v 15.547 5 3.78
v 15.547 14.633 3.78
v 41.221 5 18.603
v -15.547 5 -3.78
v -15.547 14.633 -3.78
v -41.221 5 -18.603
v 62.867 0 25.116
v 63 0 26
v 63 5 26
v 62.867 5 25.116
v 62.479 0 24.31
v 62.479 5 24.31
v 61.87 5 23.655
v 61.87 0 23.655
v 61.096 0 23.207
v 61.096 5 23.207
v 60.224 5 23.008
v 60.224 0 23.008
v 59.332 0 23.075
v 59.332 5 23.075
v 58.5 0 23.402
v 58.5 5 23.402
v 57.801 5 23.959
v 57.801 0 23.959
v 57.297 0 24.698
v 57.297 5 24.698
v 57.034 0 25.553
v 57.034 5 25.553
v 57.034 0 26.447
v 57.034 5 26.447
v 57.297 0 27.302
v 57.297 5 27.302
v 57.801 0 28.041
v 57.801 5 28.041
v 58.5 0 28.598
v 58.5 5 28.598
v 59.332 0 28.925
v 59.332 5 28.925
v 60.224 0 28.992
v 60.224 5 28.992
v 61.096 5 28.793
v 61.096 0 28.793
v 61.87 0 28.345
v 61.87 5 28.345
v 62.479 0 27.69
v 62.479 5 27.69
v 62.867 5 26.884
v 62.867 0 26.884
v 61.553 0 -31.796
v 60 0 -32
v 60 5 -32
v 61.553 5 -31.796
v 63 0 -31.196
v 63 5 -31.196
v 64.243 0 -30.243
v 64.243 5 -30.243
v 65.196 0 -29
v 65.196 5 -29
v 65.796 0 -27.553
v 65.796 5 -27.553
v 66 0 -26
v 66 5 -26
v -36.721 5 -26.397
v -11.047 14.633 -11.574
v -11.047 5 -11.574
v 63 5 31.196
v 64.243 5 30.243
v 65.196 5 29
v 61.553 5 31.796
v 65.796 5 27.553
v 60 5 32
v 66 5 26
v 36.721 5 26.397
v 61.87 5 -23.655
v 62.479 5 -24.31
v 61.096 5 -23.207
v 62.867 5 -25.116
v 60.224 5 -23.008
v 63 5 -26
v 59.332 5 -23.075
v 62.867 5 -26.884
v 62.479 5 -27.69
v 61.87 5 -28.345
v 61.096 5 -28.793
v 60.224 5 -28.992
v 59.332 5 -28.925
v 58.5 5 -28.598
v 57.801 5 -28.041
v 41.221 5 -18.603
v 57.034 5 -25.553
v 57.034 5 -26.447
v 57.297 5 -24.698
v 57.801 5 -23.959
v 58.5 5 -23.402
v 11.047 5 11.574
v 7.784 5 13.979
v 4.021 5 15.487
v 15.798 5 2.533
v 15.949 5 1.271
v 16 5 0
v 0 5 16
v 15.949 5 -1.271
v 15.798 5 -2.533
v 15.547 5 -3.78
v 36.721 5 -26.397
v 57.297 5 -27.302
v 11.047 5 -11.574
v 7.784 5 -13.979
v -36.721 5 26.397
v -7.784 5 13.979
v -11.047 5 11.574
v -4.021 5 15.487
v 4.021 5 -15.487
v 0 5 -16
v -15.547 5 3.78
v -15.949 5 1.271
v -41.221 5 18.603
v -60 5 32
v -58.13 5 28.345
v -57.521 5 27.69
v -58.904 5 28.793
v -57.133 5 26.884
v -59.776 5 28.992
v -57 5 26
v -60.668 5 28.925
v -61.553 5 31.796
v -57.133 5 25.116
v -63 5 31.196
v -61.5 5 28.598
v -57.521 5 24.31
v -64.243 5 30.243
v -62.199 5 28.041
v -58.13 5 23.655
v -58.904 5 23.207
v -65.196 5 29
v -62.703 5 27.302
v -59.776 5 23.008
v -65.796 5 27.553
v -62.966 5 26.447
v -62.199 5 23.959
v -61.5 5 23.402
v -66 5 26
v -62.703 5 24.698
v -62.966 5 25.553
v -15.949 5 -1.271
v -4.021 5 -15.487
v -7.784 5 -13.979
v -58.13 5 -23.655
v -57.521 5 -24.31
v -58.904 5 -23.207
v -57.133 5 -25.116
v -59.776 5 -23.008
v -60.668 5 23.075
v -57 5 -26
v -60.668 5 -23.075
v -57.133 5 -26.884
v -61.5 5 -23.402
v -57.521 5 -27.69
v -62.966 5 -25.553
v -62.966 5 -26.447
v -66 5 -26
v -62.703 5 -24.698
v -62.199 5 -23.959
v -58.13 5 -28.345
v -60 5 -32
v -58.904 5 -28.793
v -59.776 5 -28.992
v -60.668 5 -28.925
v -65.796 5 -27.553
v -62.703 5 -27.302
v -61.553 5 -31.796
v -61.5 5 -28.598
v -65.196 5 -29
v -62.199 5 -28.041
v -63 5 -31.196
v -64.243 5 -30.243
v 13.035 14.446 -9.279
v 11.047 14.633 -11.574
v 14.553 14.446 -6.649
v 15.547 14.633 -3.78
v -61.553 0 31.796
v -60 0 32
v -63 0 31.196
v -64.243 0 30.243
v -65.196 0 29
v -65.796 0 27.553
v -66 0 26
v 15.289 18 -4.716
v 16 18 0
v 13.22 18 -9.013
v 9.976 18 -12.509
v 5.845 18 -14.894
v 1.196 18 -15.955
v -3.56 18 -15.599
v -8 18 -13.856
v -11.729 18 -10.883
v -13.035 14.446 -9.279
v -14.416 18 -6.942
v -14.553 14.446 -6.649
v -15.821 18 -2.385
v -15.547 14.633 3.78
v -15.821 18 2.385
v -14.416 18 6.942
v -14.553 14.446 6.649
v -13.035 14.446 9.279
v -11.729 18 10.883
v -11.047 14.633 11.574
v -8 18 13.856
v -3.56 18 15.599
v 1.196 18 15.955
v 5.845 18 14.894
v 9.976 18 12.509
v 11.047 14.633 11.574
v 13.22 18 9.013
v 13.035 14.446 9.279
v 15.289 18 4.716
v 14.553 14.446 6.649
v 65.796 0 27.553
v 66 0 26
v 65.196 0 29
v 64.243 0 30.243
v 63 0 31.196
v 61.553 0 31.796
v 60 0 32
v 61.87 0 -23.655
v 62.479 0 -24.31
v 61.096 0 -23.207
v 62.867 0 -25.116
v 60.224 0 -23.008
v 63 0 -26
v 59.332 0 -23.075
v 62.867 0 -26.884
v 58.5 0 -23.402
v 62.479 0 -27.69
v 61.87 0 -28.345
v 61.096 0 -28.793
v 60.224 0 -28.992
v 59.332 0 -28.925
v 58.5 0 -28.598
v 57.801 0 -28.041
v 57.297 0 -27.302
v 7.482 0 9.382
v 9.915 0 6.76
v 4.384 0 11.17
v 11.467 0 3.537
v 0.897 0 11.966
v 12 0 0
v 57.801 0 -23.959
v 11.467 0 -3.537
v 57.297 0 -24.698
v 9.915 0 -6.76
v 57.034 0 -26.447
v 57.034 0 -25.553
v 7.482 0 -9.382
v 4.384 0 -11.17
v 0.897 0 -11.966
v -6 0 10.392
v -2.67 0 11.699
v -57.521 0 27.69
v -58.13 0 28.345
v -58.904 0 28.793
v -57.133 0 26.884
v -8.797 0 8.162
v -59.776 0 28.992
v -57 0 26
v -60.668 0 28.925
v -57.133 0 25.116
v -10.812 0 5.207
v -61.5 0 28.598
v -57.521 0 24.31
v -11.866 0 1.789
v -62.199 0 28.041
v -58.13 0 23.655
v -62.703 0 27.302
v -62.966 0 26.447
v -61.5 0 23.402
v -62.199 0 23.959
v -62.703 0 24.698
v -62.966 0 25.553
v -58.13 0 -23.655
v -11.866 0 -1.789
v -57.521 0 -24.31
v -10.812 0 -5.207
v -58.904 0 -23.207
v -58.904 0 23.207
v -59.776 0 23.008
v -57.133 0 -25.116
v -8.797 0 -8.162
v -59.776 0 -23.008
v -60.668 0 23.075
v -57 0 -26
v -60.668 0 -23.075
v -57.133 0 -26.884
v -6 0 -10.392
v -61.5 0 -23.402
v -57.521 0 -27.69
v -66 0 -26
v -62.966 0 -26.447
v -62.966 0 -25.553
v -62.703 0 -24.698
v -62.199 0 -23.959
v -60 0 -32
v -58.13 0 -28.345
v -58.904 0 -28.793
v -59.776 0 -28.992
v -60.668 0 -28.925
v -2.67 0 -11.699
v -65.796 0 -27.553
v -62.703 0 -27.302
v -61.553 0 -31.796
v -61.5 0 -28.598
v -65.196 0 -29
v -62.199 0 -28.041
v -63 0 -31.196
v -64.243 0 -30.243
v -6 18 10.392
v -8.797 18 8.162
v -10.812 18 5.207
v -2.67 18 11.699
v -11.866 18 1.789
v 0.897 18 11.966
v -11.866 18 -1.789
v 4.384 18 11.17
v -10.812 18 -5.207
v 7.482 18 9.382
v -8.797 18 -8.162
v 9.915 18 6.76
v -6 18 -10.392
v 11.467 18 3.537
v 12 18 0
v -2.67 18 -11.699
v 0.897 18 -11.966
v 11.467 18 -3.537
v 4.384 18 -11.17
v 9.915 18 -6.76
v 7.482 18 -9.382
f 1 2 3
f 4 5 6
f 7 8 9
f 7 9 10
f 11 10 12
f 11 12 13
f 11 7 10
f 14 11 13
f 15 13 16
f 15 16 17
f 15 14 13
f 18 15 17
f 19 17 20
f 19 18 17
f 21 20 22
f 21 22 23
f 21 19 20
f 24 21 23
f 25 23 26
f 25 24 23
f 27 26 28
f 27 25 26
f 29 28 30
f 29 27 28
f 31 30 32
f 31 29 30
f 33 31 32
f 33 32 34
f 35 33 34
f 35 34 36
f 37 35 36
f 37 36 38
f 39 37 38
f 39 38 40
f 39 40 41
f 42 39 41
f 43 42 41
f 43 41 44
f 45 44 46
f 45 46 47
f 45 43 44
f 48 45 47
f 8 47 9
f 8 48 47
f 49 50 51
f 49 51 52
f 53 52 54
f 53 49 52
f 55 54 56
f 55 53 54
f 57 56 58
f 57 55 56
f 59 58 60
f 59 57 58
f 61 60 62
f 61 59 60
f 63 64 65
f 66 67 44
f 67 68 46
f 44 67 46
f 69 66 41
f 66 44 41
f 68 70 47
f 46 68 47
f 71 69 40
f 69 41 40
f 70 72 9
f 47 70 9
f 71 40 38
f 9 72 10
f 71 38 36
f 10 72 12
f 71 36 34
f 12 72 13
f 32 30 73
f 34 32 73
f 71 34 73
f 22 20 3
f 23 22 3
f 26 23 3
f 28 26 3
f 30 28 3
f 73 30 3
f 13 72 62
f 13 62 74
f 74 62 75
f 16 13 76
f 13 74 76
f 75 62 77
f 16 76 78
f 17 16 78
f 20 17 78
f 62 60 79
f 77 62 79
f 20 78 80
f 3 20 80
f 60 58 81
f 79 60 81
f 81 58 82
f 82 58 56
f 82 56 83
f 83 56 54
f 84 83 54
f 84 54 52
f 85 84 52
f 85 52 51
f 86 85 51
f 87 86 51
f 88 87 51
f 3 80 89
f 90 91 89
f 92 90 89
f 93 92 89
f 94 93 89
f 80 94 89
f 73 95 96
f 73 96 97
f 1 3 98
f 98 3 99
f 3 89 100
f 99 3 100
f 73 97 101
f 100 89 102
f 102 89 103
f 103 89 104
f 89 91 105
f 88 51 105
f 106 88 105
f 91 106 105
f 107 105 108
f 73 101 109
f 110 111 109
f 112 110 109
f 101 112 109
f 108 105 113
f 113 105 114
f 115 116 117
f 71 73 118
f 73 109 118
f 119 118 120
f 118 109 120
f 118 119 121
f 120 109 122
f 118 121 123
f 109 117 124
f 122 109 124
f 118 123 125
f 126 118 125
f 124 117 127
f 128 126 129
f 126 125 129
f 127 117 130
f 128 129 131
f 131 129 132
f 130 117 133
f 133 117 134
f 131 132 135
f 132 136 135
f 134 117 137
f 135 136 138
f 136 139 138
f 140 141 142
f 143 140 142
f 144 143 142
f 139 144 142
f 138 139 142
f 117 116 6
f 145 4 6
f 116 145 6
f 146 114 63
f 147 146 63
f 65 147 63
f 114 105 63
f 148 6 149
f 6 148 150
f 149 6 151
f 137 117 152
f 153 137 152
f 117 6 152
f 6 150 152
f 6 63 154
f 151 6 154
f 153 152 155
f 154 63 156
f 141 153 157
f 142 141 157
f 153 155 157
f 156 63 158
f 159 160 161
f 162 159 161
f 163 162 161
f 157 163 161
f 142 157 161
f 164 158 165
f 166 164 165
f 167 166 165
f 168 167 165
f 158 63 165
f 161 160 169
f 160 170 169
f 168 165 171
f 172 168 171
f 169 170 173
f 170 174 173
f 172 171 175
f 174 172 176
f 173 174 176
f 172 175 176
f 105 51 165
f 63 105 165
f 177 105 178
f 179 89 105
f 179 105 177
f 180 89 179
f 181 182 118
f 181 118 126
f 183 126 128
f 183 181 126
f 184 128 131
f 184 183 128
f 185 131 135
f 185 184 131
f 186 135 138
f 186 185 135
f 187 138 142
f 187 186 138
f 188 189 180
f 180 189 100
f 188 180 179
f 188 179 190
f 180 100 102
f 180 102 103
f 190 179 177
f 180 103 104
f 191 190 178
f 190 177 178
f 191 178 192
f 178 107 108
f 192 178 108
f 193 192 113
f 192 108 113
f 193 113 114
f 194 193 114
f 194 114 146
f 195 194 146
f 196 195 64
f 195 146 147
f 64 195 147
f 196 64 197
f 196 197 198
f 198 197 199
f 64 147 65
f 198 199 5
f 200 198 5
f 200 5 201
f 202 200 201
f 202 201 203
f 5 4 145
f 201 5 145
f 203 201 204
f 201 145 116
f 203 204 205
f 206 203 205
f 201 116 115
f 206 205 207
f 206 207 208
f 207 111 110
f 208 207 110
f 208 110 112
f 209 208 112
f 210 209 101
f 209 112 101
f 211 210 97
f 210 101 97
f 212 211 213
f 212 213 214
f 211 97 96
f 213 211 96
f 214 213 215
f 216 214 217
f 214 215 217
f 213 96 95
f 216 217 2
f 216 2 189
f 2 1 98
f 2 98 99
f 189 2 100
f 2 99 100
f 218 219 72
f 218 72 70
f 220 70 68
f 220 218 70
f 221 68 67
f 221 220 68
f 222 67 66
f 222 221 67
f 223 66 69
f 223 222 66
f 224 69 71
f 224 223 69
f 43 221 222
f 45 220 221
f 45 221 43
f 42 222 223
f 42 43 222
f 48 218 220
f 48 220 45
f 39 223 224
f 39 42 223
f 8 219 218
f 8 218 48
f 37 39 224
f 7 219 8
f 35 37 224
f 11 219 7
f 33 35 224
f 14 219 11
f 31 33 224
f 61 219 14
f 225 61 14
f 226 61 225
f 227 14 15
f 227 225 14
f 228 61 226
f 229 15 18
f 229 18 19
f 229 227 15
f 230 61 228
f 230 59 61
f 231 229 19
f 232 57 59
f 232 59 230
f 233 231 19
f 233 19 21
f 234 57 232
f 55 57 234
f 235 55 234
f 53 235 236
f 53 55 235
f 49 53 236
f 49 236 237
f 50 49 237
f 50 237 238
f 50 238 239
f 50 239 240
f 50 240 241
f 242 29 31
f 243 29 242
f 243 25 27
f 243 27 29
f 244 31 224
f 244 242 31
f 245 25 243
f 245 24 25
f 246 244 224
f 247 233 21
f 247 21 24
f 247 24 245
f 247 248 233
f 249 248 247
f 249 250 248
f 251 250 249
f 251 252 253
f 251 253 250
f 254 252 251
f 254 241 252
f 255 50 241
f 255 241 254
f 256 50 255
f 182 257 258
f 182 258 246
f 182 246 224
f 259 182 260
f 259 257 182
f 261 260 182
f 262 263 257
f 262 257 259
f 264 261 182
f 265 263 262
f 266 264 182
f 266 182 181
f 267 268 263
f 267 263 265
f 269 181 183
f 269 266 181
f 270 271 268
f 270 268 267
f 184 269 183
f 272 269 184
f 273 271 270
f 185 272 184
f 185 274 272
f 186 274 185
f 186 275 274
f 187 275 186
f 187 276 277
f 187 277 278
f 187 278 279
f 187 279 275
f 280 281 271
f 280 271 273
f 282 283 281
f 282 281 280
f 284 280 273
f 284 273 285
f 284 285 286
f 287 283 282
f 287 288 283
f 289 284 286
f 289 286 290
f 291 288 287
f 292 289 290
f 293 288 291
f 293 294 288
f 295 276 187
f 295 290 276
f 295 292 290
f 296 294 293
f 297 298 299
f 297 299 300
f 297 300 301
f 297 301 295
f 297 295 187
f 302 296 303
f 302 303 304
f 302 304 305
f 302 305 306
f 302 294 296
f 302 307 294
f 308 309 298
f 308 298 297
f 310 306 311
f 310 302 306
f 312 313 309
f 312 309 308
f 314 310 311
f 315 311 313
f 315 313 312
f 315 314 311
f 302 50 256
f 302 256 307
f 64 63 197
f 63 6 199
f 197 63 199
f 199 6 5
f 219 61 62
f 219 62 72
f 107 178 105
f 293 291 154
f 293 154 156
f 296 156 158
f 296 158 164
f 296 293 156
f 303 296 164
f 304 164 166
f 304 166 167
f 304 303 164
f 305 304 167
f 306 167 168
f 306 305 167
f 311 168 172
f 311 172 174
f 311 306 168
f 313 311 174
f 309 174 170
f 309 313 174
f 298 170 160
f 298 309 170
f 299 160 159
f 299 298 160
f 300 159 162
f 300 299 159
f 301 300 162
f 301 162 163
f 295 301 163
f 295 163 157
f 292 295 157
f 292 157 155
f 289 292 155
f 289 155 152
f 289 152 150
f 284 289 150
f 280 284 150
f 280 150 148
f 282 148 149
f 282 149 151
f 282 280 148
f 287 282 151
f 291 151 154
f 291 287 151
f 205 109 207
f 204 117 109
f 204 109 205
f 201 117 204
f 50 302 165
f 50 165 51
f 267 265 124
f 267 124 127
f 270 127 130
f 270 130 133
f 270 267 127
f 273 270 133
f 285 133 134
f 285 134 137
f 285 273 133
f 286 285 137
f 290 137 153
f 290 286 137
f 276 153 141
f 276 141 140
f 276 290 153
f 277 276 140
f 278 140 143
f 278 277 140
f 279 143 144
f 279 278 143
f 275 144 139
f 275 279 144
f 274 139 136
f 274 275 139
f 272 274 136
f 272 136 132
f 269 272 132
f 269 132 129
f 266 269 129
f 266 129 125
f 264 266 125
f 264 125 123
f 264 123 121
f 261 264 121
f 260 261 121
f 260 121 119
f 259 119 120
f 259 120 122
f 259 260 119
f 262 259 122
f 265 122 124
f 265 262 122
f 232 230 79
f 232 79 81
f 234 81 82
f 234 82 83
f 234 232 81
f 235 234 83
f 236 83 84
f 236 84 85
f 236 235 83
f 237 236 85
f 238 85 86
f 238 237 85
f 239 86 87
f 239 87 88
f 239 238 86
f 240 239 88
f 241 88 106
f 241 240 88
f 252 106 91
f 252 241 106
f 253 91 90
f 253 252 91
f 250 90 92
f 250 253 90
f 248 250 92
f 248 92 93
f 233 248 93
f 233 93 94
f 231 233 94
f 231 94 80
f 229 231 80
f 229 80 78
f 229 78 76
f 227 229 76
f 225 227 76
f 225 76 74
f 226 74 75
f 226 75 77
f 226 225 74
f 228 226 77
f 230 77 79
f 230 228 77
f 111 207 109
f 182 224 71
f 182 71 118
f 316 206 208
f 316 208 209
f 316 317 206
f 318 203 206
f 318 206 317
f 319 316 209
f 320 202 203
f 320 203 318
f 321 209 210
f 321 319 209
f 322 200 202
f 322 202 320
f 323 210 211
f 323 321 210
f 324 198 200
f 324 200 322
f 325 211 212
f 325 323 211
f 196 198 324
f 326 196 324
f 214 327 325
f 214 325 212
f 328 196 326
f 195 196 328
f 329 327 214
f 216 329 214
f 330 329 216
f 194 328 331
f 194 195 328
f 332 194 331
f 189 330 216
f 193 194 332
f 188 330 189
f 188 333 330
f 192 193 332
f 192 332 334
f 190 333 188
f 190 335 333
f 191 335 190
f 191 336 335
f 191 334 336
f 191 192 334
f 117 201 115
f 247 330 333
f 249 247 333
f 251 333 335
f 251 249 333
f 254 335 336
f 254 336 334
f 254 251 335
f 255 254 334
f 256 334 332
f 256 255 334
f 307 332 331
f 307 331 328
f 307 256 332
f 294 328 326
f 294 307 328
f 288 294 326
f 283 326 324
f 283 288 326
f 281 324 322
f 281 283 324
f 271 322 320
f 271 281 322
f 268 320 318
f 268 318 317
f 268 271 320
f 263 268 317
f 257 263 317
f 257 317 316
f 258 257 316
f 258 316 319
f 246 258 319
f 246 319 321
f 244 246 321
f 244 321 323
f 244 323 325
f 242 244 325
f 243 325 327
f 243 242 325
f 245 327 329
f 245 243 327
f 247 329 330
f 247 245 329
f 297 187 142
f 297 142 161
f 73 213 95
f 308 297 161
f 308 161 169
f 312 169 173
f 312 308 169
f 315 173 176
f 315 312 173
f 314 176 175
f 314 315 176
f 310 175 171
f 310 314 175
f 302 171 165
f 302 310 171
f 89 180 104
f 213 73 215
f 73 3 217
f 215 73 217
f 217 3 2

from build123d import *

# Parameters (mm, degrees)
SKETCH1_R           = 3
BOSS_EXTRUDE1_DEPTH = 5
SKETCH2_R           = 12
CUT_EXTRUDE1_DEPTH  = 5
BOSS_EXTRUDE2_START = 13
SKETCH2_3_R         = 16
SKETCH2_3_R_2       = 12
BOSS_EXTRUDE2_DEPTH = 13
BOSS_EXTRUDE5_DEPTH = 4.5


with BuildPart() as part:
    # Sketch1 → Boss-Extrude1 (new body)
    with BuildSketch(Plane(origin=(0, 0, 0), x_dir=(1, 0, 0), z_dir=(0, 1, 0))):
        with BuildLine():
            Line((-60, 32), (60, 32))
            ThreePointArc((60, 32), (64.242640687, 30.242640687), (66, 26))
            Line((66, 26), (66, -26))
            ThreePointArc((66, -26), (64.242640687, -30.242640687), (60, -32))
            Line((60, -32), (-60, -32))
            ThreePointArc((-60, -32), (-64.242640687, -30.242640687), (-66, -26))
            Line((-66, -26), (-66, 26))
            ThreePointArc((-66, 26), (-64.242640687, 30.242640687), (-60, 32))
        make_face()
        with Locations((-60, 26)):
            Circle(SKETCH1_R, mode=Mode.SUBTRACT)
        with Locations((-60, -26)):
            Circle(SKETCH1_R, mode=Mode.SUBTRACT)
        with Locations((60, 26)):
            Circle(SKETCH1_R, mode=Mode.SUBTRACT)
        with Locations((60, -26)):
            Circle(SKETCH1_R, mode=Mode.SUBTRACT)
    extrude(amount=BOSS_EXTRUDE1_DEPTH)

    # Sketch2 → Cut-Extrude1 (cut)
    with BuildSketch(Plane(origin=(0, 5, 0), x_dir=(1, 0, 0), z_dir=(0, 1, 0))):
        Circle(SKETCH2_R)
    extrude(amount=-CUT_EXTRUDE1_DEPTH, mode=Mode.SUBTRACT)

    # Sketch2<3> → Boss-Extrude2 (add)
    with BuildSketch(Plane(origin=(0, 5, 0), x_dir=(1, 0, 0), z_dir=(0, 1, 0)).offset(BOSS_EXTRUDE2_START)):
        Circle(SKETCH2_3_R)
        Circle(SKETCH2_3_R_2, mode=Mode.SUBTRACT)
    extrude(amount=-BOSS_EXTRUDE2_DEPTH)

    # Sketch4 → Boss-Extrude5 (add, symmetric)
    with BuildSketch(Plane(origin=(0, 0, 0), x_dir=(0.8660254037844379, 0, -0.5000000000000014), z_dir=(0.5000000000000014, 0, 0.8660254037844379))):
        Polygon((-45, 5), (-14.70481954, 14.843500832), (-14.70481954, 5), align=None)
        Polygon((14.70481954, 14.843500832), (14.70481954, 5), (45, 5), align=None)
    boss_extrude5 = extrude(amount=BOSS_EXTRUDE5_DEPTH, both=True)

    # Mirror1: Boss-Extrude5 across plane
    add(boss_extrude5.mirror(Plane.XY))


solid = part.part
